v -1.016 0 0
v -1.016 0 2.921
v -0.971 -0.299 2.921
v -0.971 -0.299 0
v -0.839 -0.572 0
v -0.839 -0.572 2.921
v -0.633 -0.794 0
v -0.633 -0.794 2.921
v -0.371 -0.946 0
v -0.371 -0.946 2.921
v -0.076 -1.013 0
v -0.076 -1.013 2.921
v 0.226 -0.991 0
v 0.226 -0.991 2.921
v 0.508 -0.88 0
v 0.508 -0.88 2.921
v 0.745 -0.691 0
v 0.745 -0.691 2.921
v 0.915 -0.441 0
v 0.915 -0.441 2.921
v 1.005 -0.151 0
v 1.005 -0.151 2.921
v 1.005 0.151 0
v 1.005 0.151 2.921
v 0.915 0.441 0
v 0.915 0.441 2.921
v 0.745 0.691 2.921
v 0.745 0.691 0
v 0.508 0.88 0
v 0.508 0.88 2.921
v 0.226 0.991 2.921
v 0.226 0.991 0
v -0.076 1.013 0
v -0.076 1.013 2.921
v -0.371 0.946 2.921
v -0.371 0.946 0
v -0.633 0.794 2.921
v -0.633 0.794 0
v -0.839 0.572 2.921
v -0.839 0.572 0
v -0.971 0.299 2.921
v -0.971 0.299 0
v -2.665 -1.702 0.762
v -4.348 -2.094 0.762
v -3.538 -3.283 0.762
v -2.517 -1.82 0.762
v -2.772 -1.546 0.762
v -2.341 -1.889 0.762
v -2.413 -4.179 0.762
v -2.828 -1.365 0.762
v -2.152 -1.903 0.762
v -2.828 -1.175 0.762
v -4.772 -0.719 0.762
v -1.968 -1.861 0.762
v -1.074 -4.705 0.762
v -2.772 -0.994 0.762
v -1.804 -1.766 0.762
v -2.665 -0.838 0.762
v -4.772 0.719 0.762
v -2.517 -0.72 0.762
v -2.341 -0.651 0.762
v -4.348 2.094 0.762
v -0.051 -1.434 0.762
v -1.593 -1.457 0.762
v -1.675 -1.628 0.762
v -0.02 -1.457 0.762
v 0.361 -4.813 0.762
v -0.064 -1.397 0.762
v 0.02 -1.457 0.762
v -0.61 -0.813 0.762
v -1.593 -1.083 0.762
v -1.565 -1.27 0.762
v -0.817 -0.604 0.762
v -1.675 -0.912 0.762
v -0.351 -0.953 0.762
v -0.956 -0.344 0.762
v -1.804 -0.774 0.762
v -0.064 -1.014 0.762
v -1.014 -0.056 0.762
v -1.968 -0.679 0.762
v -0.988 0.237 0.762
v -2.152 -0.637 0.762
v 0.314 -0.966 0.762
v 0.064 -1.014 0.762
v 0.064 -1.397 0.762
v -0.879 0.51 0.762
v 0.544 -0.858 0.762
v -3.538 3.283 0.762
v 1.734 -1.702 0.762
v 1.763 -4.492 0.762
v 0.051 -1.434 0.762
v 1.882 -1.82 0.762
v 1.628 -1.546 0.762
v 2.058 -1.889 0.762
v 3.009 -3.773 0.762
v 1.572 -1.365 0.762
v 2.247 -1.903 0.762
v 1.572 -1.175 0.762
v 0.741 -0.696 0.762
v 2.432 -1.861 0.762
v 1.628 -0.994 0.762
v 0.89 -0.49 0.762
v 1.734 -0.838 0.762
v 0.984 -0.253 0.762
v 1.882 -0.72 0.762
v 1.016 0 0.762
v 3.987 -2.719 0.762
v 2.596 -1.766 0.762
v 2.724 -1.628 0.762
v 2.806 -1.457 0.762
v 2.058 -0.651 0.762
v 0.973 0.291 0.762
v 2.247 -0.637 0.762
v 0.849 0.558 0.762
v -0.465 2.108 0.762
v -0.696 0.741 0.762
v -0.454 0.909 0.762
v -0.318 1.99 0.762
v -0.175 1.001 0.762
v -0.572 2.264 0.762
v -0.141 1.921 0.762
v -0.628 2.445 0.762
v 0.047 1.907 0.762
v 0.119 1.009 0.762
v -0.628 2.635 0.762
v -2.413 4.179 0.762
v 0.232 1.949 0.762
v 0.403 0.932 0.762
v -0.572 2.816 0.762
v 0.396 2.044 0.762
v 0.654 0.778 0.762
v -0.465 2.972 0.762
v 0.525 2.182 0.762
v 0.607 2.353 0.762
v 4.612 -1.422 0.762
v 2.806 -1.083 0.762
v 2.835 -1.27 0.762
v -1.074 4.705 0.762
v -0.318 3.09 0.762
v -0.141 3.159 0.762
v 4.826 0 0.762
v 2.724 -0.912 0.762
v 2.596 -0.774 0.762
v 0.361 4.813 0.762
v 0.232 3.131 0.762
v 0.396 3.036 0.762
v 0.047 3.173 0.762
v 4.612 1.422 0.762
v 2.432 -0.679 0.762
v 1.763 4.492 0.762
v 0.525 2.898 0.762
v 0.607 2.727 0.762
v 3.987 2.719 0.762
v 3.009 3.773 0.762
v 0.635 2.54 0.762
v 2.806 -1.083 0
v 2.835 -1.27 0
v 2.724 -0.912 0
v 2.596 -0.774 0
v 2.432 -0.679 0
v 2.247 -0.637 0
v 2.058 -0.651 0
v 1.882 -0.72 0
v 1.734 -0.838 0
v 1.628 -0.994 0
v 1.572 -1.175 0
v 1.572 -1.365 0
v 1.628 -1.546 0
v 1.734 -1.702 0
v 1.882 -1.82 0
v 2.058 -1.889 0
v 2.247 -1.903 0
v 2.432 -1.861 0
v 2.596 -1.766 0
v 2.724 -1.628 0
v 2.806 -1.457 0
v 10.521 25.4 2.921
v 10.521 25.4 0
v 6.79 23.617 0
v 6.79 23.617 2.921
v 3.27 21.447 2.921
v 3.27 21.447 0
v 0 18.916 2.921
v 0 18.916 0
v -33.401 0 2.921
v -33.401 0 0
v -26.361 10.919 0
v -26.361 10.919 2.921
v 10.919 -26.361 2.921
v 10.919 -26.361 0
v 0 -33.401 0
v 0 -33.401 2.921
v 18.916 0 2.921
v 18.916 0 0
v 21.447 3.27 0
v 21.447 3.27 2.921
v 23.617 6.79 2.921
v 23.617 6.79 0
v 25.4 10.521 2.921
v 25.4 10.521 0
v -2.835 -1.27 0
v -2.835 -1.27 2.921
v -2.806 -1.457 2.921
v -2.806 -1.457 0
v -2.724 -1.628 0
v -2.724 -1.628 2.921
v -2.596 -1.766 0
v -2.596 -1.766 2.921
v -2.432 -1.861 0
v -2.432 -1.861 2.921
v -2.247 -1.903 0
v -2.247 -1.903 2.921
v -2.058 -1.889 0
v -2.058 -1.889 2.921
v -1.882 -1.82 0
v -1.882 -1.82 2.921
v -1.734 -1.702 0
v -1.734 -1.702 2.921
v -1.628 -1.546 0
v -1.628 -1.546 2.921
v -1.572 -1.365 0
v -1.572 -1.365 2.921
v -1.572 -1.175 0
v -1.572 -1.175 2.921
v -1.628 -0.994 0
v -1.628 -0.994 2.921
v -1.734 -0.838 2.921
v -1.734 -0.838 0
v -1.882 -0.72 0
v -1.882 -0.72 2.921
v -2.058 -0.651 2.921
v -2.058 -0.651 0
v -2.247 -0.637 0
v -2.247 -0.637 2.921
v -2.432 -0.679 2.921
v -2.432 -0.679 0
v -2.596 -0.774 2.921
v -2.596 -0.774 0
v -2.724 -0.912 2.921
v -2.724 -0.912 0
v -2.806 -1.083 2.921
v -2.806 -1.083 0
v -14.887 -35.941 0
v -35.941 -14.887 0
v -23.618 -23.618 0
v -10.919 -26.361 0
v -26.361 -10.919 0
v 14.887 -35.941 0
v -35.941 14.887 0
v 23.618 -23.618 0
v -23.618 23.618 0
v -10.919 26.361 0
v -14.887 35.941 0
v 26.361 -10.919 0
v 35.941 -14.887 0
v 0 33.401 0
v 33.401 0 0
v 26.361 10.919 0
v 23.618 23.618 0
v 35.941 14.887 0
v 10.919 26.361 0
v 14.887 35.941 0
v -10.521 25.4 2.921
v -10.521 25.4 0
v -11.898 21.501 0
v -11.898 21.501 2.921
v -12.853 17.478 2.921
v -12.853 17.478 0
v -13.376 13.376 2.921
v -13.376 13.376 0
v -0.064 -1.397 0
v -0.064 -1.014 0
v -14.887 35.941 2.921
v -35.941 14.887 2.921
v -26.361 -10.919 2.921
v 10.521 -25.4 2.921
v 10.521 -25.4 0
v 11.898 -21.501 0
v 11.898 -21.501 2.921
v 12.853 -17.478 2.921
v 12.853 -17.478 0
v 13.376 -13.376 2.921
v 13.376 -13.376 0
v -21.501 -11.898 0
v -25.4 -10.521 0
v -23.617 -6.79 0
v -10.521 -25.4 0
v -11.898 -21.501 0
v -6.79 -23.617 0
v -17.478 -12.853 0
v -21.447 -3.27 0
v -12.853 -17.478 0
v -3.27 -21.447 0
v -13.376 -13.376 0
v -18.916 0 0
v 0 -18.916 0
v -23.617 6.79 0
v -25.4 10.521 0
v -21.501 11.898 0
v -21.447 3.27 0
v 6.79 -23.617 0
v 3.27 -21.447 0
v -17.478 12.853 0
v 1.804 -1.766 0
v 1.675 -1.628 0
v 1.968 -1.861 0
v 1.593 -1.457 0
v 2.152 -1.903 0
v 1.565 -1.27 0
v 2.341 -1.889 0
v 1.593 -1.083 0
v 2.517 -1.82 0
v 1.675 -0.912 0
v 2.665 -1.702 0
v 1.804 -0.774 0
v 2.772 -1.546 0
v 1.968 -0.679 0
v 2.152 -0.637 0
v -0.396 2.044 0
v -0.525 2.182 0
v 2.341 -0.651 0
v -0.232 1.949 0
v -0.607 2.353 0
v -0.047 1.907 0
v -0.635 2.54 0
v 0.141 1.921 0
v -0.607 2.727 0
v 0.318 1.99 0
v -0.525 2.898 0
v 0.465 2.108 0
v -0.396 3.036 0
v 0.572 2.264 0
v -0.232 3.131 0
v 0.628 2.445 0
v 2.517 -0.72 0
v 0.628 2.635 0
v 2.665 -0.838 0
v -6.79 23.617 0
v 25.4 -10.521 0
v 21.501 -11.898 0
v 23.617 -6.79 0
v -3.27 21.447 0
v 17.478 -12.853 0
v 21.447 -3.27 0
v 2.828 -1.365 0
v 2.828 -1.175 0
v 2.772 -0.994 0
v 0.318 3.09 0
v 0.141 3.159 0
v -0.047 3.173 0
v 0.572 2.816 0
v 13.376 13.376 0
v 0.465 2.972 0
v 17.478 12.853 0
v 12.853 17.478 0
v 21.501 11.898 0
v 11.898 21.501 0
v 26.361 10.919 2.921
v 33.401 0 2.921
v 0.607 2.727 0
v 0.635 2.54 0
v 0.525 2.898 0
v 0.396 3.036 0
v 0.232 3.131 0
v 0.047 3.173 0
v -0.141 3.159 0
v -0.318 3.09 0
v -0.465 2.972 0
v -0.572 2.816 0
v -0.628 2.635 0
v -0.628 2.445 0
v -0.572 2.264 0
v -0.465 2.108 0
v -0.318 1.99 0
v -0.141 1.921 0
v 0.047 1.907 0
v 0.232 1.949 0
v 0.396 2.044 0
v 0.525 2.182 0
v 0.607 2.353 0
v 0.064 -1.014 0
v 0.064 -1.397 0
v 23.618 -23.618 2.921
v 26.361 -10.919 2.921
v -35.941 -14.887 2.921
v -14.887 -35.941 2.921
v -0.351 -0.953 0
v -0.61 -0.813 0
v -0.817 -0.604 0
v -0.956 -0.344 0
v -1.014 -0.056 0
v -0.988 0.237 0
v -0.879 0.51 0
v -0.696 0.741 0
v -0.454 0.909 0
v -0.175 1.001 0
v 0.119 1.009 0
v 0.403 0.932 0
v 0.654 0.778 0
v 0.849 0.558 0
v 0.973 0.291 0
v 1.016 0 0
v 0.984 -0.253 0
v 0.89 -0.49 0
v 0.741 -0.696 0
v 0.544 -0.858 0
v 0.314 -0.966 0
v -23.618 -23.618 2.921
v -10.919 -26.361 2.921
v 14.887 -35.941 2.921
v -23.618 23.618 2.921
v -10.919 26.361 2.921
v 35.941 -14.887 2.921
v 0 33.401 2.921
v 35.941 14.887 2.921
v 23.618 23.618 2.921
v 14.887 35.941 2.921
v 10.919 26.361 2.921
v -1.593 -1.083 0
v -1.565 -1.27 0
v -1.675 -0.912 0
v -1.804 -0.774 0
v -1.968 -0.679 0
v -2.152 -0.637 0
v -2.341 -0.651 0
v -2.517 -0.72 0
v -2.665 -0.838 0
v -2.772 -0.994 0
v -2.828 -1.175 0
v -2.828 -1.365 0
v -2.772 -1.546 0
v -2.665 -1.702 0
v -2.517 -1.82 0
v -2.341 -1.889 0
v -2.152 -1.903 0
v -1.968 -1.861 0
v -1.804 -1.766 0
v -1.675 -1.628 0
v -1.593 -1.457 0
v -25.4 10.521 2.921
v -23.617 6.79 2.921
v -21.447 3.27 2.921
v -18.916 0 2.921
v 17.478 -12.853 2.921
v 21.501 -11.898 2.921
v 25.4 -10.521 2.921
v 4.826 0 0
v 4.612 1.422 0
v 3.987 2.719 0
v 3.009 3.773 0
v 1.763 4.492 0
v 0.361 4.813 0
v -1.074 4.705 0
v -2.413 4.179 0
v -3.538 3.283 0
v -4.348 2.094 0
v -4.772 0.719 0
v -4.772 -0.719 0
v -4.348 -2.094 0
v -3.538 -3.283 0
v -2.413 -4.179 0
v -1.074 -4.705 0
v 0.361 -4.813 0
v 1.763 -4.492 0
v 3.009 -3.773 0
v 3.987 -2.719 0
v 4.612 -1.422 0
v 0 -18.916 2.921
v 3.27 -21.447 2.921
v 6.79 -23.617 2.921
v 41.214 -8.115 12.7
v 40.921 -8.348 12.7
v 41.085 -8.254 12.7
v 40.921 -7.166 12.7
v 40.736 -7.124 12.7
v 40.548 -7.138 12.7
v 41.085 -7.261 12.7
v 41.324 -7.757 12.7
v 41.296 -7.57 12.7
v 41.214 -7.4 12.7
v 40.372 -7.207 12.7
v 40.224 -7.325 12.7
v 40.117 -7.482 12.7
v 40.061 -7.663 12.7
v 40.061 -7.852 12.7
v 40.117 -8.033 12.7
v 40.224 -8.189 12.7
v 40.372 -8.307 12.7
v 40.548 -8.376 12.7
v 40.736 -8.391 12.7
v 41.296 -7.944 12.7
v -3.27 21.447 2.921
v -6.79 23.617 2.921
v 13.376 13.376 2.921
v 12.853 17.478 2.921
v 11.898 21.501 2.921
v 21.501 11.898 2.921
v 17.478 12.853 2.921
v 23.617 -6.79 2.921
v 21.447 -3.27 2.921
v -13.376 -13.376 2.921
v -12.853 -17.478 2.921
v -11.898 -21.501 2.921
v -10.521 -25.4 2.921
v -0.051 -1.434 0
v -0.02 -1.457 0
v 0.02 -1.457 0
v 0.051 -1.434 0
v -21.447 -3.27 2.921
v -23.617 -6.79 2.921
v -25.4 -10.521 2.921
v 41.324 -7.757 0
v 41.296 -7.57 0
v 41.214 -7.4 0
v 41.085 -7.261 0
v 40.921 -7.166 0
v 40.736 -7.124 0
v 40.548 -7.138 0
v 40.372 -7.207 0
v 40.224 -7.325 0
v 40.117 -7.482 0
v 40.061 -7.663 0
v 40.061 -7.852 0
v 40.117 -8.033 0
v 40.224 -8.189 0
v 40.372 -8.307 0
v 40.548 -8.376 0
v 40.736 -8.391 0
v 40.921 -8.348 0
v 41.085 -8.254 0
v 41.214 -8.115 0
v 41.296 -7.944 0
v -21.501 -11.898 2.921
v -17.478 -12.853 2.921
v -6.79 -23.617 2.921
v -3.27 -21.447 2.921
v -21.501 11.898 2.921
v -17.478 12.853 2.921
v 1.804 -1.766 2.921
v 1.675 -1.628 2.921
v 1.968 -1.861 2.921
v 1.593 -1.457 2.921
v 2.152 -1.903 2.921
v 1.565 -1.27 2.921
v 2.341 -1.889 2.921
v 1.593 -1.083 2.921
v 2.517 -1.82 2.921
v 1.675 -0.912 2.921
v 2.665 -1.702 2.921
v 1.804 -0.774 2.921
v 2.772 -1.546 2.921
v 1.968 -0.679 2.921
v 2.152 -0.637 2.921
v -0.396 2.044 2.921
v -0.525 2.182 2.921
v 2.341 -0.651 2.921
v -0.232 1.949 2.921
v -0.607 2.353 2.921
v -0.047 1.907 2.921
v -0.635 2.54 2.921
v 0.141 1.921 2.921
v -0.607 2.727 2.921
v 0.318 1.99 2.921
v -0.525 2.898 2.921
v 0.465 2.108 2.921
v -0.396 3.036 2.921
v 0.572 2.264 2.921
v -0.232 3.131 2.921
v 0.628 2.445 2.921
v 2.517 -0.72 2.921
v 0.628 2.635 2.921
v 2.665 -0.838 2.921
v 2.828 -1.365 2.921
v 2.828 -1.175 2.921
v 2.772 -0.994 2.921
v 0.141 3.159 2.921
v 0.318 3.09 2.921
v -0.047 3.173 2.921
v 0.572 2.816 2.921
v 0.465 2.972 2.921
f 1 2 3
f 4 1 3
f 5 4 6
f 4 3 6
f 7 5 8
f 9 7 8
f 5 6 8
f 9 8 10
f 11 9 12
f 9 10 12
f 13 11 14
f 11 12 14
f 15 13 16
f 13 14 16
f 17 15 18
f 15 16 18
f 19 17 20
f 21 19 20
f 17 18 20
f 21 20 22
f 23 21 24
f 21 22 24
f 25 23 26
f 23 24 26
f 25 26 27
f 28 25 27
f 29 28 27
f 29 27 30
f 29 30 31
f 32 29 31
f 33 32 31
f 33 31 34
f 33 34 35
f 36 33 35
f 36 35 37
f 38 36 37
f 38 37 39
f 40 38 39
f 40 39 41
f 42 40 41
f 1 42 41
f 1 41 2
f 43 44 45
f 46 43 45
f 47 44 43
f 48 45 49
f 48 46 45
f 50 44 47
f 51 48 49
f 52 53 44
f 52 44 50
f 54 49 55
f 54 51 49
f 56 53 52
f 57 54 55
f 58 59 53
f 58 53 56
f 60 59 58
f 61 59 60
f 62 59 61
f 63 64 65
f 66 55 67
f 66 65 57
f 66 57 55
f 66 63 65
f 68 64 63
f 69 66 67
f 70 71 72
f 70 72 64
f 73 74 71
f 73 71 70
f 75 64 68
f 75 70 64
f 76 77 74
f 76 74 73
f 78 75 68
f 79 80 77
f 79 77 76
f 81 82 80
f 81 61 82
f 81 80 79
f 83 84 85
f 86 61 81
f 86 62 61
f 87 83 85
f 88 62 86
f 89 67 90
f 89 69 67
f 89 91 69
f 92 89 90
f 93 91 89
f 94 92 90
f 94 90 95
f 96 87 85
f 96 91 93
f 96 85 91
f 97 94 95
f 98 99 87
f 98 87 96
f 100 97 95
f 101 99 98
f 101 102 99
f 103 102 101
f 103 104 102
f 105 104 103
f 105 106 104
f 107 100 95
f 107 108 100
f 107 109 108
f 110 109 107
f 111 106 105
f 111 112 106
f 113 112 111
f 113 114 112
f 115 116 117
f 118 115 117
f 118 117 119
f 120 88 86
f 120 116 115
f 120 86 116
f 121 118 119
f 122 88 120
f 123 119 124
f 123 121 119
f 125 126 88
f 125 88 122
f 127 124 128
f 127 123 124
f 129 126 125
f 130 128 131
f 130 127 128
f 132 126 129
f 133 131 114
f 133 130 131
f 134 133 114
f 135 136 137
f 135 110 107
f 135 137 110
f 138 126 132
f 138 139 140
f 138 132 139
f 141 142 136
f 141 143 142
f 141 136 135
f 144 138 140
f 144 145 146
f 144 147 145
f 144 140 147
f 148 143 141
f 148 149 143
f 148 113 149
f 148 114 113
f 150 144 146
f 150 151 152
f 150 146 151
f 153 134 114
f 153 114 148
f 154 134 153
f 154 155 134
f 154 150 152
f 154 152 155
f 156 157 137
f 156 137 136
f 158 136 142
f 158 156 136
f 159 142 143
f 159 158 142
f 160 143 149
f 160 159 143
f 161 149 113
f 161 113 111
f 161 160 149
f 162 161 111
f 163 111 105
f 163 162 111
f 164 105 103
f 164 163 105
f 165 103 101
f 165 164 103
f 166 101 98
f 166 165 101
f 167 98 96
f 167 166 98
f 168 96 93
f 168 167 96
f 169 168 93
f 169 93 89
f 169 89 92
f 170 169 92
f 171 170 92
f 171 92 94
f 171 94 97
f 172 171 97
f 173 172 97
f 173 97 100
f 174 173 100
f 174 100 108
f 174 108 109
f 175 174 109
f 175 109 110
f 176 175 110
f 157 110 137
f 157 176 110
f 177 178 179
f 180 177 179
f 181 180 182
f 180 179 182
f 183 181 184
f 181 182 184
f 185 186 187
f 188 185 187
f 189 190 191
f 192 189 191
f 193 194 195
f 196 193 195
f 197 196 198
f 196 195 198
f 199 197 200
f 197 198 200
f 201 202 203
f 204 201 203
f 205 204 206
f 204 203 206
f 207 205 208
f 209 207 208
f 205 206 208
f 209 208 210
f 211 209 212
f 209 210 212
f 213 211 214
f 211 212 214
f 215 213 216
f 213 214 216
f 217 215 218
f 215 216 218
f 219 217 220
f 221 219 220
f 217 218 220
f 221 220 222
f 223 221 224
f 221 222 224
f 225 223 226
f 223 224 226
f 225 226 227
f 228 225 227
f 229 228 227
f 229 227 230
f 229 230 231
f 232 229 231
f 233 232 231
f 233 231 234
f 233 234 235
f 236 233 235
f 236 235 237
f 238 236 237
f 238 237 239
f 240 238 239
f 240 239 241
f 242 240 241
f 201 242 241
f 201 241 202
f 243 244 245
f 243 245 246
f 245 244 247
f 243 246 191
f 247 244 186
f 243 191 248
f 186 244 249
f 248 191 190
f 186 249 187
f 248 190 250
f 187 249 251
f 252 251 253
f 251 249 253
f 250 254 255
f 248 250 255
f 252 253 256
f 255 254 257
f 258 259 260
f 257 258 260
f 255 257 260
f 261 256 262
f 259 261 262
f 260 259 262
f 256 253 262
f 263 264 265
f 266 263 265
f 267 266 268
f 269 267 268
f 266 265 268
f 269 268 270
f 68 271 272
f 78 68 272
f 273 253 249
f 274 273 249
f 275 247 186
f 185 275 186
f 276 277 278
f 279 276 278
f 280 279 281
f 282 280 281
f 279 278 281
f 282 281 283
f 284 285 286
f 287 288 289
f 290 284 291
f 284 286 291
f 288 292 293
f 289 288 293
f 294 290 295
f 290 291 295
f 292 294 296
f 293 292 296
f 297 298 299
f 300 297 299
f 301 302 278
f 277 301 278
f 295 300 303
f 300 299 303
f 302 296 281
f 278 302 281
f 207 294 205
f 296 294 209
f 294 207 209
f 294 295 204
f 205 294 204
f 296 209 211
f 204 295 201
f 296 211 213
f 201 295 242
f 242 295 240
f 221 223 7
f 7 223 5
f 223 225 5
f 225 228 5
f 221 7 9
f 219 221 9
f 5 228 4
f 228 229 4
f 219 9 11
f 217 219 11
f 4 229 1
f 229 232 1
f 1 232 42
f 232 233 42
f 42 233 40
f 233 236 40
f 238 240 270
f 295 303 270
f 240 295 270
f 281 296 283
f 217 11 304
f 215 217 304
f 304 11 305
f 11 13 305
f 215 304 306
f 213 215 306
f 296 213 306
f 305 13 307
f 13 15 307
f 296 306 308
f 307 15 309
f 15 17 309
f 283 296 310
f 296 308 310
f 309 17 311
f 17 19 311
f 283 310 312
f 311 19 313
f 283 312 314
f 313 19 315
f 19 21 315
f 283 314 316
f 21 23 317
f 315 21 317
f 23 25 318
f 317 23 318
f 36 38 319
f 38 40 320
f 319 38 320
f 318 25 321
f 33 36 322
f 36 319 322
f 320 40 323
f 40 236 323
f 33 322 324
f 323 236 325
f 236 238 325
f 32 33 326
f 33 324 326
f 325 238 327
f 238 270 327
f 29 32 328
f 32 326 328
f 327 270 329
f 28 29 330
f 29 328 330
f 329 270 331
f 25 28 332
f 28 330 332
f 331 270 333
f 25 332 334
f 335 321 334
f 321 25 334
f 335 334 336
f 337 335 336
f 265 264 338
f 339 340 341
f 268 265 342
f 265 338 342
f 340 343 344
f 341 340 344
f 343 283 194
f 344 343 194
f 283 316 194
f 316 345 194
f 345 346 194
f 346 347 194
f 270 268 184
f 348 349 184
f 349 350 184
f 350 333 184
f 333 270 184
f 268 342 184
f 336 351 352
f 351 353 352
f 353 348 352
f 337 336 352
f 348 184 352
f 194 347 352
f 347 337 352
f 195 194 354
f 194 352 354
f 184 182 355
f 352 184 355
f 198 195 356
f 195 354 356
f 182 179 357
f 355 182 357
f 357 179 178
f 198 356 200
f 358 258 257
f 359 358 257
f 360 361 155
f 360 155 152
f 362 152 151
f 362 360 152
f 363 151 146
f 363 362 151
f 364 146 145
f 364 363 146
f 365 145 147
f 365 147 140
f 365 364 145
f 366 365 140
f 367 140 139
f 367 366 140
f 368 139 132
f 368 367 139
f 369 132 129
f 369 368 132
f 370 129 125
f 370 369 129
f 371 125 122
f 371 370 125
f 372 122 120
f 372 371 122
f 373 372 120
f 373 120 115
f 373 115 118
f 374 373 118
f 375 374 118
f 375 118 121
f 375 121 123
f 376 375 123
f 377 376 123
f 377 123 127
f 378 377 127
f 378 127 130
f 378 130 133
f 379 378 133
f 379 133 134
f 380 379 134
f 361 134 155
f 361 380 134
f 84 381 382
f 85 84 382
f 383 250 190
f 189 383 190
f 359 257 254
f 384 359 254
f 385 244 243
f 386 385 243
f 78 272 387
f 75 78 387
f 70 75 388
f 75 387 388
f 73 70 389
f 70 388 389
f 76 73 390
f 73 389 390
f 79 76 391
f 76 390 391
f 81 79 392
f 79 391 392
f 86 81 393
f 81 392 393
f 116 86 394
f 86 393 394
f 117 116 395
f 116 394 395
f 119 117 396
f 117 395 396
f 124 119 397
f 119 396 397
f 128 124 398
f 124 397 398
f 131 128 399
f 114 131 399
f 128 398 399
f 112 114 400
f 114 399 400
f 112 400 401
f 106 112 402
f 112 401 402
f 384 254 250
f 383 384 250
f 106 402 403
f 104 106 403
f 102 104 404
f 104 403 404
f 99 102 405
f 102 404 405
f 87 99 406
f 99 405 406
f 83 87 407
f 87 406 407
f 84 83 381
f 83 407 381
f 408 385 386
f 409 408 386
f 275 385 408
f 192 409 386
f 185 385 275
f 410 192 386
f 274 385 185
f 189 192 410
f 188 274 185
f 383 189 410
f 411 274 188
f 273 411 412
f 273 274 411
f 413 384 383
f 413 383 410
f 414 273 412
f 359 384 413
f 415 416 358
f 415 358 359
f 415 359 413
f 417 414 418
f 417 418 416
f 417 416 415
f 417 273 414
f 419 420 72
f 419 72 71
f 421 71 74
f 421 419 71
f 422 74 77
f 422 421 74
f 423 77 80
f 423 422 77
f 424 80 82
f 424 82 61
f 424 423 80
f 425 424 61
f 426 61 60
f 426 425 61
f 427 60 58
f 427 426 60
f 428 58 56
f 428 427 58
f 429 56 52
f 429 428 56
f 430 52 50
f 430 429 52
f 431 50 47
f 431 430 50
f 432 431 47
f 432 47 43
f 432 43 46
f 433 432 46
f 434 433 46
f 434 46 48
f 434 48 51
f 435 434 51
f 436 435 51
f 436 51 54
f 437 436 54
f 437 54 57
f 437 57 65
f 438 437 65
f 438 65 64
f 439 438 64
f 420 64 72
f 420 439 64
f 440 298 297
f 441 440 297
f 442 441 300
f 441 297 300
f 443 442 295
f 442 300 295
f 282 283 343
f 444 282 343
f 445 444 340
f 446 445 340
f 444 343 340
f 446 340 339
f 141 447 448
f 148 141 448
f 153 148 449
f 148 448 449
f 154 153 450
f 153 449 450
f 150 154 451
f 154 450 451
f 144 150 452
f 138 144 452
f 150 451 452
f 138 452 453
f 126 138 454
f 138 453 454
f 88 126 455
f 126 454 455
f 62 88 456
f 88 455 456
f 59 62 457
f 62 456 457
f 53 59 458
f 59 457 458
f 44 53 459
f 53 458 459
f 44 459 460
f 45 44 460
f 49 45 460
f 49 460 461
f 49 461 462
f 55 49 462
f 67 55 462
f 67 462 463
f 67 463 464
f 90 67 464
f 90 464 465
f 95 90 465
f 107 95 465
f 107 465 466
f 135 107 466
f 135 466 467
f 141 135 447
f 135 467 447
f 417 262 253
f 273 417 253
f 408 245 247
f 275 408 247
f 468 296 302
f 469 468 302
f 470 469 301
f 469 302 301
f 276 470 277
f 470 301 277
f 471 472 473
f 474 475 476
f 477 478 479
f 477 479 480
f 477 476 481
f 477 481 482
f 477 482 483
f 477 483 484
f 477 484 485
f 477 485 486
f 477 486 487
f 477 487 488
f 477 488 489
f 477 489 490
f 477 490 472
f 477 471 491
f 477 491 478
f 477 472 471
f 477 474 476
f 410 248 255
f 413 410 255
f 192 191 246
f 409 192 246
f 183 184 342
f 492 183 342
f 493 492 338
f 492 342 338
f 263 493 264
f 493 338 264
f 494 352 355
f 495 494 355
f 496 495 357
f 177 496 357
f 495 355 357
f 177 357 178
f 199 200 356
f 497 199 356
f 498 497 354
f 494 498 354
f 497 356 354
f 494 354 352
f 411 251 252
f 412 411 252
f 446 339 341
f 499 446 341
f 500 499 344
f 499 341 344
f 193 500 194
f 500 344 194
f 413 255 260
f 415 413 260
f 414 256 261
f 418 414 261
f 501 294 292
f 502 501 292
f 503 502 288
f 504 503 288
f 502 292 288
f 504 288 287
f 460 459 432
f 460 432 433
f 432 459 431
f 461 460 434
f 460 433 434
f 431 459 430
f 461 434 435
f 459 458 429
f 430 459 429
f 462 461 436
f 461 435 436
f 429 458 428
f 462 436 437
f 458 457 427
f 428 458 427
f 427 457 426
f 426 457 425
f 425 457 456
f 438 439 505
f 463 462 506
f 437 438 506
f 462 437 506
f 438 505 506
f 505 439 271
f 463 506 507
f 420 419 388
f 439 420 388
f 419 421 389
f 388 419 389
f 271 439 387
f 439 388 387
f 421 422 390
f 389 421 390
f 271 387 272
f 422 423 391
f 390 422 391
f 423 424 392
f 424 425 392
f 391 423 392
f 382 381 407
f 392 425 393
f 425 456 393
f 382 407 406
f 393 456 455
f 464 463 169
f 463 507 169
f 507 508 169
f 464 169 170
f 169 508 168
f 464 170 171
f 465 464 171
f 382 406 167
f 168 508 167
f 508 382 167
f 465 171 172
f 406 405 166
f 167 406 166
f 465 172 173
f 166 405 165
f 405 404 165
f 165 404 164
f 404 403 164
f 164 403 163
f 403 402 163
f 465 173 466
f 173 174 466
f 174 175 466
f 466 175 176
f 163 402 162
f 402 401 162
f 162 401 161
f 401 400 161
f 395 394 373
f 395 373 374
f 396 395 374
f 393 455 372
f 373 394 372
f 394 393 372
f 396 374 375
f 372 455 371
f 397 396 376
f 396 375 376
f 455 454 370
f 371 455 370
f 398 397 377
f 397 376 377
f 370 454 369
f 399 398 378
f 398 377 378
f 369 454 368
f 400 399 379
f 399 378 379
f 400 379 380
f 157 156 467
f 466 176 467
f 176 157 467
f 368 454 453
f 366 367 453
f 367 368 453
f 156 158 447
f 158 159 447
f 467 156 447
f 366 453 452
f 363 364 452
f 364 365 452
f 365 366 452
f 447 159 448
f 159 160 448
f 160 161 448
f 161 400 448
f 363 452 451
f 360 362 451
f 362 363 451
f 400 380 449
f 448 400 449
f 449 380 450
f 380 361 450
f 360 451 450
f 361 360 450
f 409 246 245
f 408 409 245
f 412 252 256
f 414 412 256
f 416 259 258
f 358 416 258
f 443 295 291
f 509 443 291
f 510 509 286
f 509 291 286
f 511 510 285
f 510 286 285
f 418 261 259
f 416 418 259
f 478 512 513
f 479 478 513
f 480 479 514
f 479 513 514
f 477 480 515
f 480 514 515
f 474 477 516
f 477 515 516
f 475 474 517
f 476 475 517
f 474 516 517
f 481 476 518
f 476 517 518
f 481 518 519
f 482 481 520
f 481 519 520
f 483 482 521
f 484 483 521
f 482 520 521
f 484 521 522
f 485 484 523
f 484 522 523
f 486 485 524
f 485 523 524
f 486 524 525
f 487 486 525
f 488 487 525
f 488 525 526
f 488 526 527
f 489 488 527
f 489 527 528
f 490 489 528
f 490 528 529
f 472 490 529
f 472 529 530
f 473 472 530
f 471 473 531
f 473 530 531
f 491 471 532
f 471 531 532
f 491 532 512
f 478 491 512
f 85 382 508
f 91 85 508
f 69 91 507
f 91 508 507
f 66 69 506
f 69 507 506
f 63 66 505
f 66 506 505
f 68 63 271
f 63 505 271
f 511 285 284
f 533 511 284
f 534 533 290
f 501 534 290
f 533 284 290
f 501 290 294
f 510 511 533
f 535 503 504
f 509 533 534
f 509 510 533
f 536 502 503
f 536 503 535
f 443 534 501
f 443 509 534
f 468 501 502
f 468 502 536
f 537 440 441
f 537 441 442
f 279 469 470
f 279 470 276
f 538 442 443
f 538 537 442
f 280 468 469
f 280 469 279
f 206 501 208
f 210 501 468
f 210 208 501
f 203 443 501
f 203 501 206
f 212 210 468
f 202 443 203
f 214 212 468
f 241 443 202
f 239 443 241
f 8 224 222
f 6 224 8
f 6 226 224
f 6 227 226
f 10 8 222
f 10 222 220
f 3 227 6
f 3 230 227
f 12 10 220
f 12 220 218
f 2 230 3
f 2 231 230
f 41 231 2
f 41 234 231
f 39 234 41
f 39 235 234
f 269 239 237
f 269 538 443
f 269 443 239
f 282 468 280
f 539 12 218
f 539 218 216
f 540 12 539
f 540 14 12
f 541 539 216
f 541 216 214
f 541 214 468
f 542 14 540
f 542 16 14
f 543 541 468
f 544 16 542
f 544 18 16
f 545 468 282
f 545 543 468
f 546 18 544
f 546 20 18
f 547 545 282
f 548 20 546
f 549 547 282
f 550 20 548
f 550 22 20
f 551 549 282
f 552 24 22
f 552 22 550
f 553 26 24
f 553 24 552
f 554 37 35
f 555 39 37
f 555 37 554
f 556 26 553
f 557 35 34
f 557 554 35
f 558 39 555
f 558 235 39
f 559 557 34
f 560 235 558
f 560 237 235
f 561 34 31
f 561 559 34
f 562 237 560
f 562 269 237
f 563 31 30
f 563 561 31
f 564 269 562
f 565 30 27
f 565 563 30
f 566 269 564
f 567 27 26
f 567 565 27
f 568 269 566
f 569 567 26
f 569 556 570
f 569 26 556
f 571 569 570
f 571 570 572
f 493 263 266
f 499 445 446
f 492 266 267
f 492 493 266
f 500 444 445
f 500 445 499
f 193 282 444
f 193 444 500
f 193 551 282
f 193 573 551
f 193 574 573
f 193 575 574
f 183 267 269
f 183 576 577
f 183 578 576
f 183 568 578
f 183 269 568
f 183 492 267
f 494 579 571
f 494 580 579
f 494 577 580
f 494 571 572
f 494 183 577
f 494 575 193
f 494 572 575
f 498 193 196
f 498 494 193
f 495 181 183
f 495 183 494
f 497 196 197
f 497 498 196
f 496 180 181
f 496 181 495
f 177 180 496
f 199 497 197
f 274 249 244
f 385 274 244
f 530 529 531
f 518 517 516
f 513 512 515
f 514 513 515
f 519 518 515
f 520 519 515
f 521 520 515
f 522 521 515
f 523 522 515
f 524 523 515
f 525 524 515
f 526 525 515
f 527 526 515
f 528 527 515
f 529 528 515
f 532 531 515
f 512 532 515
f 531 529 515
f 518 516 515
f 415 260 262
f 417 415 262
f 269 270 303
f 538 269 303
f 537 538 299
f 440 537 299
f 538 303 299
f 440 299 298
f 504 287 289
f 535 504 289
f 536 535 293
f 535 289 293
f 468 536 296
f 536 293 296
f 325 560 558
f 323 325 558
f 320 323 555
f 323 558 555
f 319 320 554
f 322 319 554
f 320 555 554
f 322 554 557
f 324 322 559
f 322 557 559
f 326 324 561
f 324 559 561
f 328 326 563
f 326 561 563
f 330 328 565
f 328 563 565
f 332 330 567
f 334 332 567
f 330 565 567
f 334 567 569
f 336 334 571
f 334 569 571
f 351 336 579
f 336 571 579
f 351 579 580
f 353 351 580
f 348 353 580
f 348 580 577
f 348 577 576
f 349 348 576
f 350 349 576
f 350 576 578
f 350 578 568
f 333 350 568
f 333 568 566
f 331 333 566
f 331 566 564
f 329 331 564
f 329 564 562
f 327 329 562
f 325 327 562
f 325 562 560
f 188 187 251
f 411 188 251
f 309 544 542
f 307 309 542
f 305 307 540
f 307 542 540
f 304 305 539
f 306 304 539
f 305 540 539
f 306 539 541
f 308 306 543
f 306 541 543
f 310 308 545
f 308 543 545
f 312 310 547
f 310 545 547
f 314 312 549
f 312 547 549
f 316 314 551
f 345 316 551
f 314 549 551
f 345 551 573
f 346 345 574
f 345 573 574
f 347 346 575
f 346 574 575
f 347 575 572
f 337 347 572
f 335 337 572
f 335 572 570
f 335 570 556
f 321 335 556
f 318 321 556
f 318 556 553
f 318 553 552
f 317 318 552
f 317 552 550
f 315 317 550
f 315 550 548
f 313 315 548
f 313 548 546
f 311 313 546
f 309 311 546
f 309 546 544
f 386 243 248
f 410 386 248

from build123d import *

# Parameters (mm, degrees)
F1_DEPTH = 2.921
F2_D     = 2.032
F2_DEPTH = 12.7
F2_TIP   = 0.6104743889
F3_D     = 1.27
F3_DEPTH = 12.7
F3_TIP   = 0.3815464931
F5_DEPTH = 2.921
F6_R     = 4.826
F6_R_2   = 0.635
F7_DEPTH = 0.762
F8_R     = 0.635
F9_DEPTH = 12.7


with BuildPart() as f1:
    # F0 (on Top) → F1 (new body)
    with BuildSketch(Plane.XY):
        with BuildLine():
            ThreePointArc((-5.446083021, 13.1480074912), (-2.8705353277, 16.1713104582), (0, 18.9160934521))
            ThreePointArc((0, 18.9160934521), (-5.0012444453, 22.5787441587), (-10.5210244843, 25.4))
            ThreePointArc((-10.5210244843, 25.4), (-12.4291692436, 19.5019969669), (-13.3756979535, 13.3756979535))
            ThreePointArc((-13.3756979535, 13.3756979535), (-9.4050682898, 13.4646182815), (-5.446083021, 13.1480074912))
        make_face()
        with BuildLine():
            ThreePointArc((13.1480074912, -5.446083021), (13.4646182815, -9.4050682898), (13.3756979535, -13.3756979535))
            ThreePointArc((13.3756979535, -13.3756979535), (19.5019969669, -12.4291692436), (25.4, -10.5210244843))
            ThreePointArc((25.4, -10.5210244843), (22.5787441587, -5.0012444453), (18.9160934521, 0))
            ThreePointArc((18.9160934521, 0), (16.1713104582, -2.8705353277), (13.1480074912, -5.446083021))
        make_face()
        with BuildLine():
            ThreePointArc((5.446083021, -13.1480074912), (9.4050682898, -13.4646182815), (13.3756979535, -13.3756979535))
            ThreePointArc((13.3756979535, -13.3756979535), (13.4646182815, -9.4050682898), (13.1480074912, -5.446083021))
            ThreePointArc((13.1480074912, -5.446083021), (10.8820575886, -7.0593898615), (8.5065612285, -8.5065612285))
            ThreePointArc((8.5065612285, -8.5065612285), (7.0593898615, -10.8820575886), (5.446083021, -13.1480074912))
        make_face()
        with BuildLine():
            ThreePointArc((-5.446083021, -13.1480074912), (-2.8705353277, -16.1713104582), (0, -18.9160934521))
            ThreePointArc((0, -18.9160934521), (2.8705353277, -16.1713104582), (5.446083021, -13.1480074912))
            ThreePointArc((5.446083021, -13.1480074912), (2.7030342721, -12.6865191563), (0, -12.0300942585))
            ThreePointArc((0, -12.0300942585), (-2.7030342721, -12.6865191563), (-5.446083021, -13.1480074912))
        make_face()
        with BuildLine():
            ThreePointArc((-10.5210244843, -25.4), (-5.0012444453, -22.5787441587), (0, -18.9160934521))
            ThreePointArc((0, -18.9160934521), (-2.8705353277, -16.1713104582), (-5.446083021, -13.1480074912))
            ThreePointArc((-5.446083021, -13.1480074912), (-9.4050682898, -13.4646182815), (-13.3756979535, -13.3756979535))
            ThreePointArc((-13.3756979535, -13.3756979535), (-12.4291692436, -19.5019969669), (-10.5210244843, -25.4))
        make_face()
        with BuildLine():
            ThreePointArc((-13.3756979535, -13.3756979535), (-9.4050682898, -13.4646182815), (-5.446083021, -13.1480074912))
            ThreePointArc((-5.446083021, -13.1480074912), (-7.0593898615, -10.8820575886), (-8.5065612285, -8.5065612285))
            ThreePointArc((-8.5065612285, -8.5065612285), (-10.8820575886, -7.0593898615), (-13.1480074912, -5.446083021))
            ThreePointArc((-13.1480074912, -5.446083021), (-13.4646182815, -9.4050682898), (-13.3756979535, -13.3756979535))
        make_face()
        with BuildLine():
            ThreePointArc((-25.4, -10.5210244843), (-19.5019969669, -12.4291692436), (-13.3756979535, -13.3756979535))
            ThreePointArc((-13.3756979535, -13.3756979535), (-13.4646182815, -9.4050682898), (-13.1480074912, -5.446083021))
            ThreePointArc((-13.1480074912, -5.446083021), (-16.1713104582, -2.8705353277), (-18.9160934521, 0))
            ThreePointArc((-18.9160934521, 0), (-22.5787441587, -5.0012444453), (-25.4, -10.5210244843))
        make_face()
        with BuildLine():
            ThreePointArc((-13.1480074912, -5.446083021), (-12.6865191563, -2.7030342721), (-12.0300942585, 0))
            ThreePointArc((-12.0300942585, 0), (-12.6865191563, 2.7030342721), (-13.1480074912, 5.446083021))
            ThreePointArc((-13.1480074912, 5.446083021), (-16.1713104582, 2.8705353277), (-18.9160934521, 0))
            ThreePointArc((-18.9160934521, 0), (-16.1713104582, -2.8705353277), (-13.1480074912, -5.446083021))
        make_face()
        with BuildLine():
            ThreePointArc((-18.9160934521, 0), (-16.1713104582, 2.8705353277), (-13.1480074912, 5.446083021))
            ThreePointArc((-13.1480074912, 5.446083021), (-13.4646182815, 9.4050682898), (-13.3756979535, 13.3756979535))
            ThreePointArc((-13.3756979535, 13.3756979535), (-19.5019969669, 12.4291692436), (-25.4, 10.5210244843))
            ThreePointArc((-25.4, 10.5210244843), (-22.5787441587, 5.0012444453), (-18.9160934521, 0))
        make_face()
        with BuildLine():
            ThreePointArc((-13.3756979535, 13.3756979535), (-13.4646182815, 9.4050682898), (-13.1480074912, 5.446083021))
            ThreePointArc((-13.1480074912, 5.446083021), (-10.8820575886, 7.0593898615), (-8.5065612285, 8.5065612285))
            ThreePointArc((-8.5065612285, 8.5065612285), (-7.0593898615, 10.8820575886), (-5.446083021, 13.1480074912))
            ThreePointArc((-5.446083021, 13.1480074912), (-9.4050682898, 13.4646182815), (-13.3756979535, 13.3756979535))
        make_face()
        with BuildLine():
            ThreePointArc((0, -18.9160934521), (5.0012444453, -22.5787441587), (10.5210244843, -25.4))
            ThreePointArc((10.5210244843, -25.4), (12.4291692436, -19.5019969669), (13.3756979535, -13.3756979535))
            ThreePointArc((13.3756979535, -13.3756979535), (9.4050682898, -13.4646182815), (5.446083021, -13.1480074912))
            ThreePointArc((5.446083021, -13.1480074912), (2.8705353277, -16.1713104582), (0, -18.9160934521))
        make_face()
        with BuildLine():
            ThreePointArc((0, 12.0300942585), (2.7030342721, 12.6865191563), (5.446083021, 13.1480074912))
            ThreePointArc((5.446083021, 13.1480074912), (2.8705353277, 16.1713104582), (0, 18.9160934521))
            ThreePointArc((0, 18.9160934521), (-2.8705353277, 16.1713104582), (-5.446083021, 13.1480074912))
            ThreePointArc((-5.446083021, 13.1480074912), (-2.7030342721, 12.6865191563), (0, 12.0300942585))
        make_face()
        with BuildLine():
            ThreePointArc((0, 18.9160934521), (2.8705353277, 16.1713104582), (5.446083021, 13.1480074912))
            ThreePointArc((5.446083021, 13.1480074912), (9.4050682898, 13.4646182815), (13.3756979535, 13.3756979535))
            ThreePointArc((13.3756979535, 13.3756979535), (12.4291692436, 19.5019969669), (10.5210244843, 25.4))
            ThreePointArc((10.5210244843, 25.4), (5.0012444453, 22.5787441587), (0, 18.9160934521))
        make_face()
        with BuildLine():
            ThreePointArc((5.446083021, 13.1480074912), (7.0593898615, 10.8820575886), (8.5065612285, 8.5065612285))
            ThreePointArc((8.5065612285, 8.5065612285), (10.8820575886, 7.0593898615), (13.1480074912, 5.446083021))
            ThreePointArc((13.1480074912, 5.446083021), (13.4646182815, 9.4050682898), (13.3756979535, 13.3756979535))
            ThreePointArc((13.3756979535, 13.3756979535), (9.4050682898, 13.4646182815), (5.446083021, 13.1480074912))
        make_face()
        with BuildLine():
            ThreePointArc((13.1480074912, 5.446083021), (16.1713104582, 2.8705353277), (18.9160934521, 0))
            ThreePointArc((18.9160934521, 0), (22.5787441587, 5.0012444453), (25.4, 10.5210244843))
            ThreePointArc((25.4, 10.5210244843), (19.5019969669, 12.4291692436), (13.3756979535, 13.3756979535))
            ThreePointArc((13.3756979535, 13.3756979535), (13.4646182815, 9.4050682898), (13.1480074912, 5.446083021))
        make_face()
        with BuildLine():
            ThreePointArc((12.0300942585, 0), (12.6865191563, -2.7030342721), (13.1480074912, -5.446083021))
            ThreePointArc((13.1480074912, -5.446083021), (16.1713104582, -2.8705353277), (18.9160934521, 0))
            ThreePointArc((18.9160934521, 0), (16.1713104582, 2.8705353277), (13.1480074912, 5.446083021))
            ThreePointArc((13.1480074912, 5.446083021), (12.6865191563, 2.7030342721), (12.0300942585, 0))
        make_face()
        with BuildLine():
            ThreePointArc((8.5065612285, 8.5065612285), (10.5210244843, 4.3579510314), (12.0300942585, 0))
            ThreePointArc((12.0300942585, 0), (12.6865191563, 2.7030342721), (13.1480074912, 5.446083021))
            ThreePointArc((13.1480074912, 5.446083021), (10.8820575886, 7.0593898615), (8.5065612285, 8.5065612285))
        make_face()
        with BuildLine():
            ThreePointArc((8.5065612285, -8.5065612285), (10.8820575886, -7.0593898615), (13.1480074912, -5.446083021))
            ThreePointArc((13.1480074912, -5.446083021), (12.6865191563, -2.7030342721), (12.0300942585, 0))
            ThreePointArc((12.0300942585, 0), (10.5210244843, -4.3579510314), (8.5065612285, -8.5065612285))
        make_face()
        with BuildLine():
            ThreePointArc((0, -12.0300942585), (2.7030342721, -12.6865191563), (5.446083021, -13.1480074912))
            ThreePointArc((5.446083021, -13.1480074912), (7.0593898615, -10.8820575886), (8.5065612285, -8.5065612285))
            ThreePointArc((8.5065612285, -8.5065612285), (4.3579510314, -10.5210244843), (0, -12.0300942585))
        make_face()
        with BuildLine():
            ThreePointArc((-8.5065612285, -8.5065612285), (-7.0593898615, -10.8820575886), (-5.446083021, -13.1480074912))
            ThreePointArc((-5.446083021, -13.1480074912), (-2.7030342721, -12.6865191563), (0, -12.0300942585))
            ThreePointArc((0, -12.0300942585), (-4.3579510314, -10.5210244843), (-8.5065612285, -8.5065612285))
        make_face()
        with BuildLine():
            ThreePointArc((-13.1480074912, -5.446083021), (-10.8820575886, -7.0593898615), (-8.5065612285, -8.5065612285))
            ThreePointArc((-8.5065612285, -8.5065612285), (-10.5210244843, -4.3579510314), (-12.0300942585, 0))
            ThreePointArc((-12.0300942585, 0), (-12.6865191563, -2.7030342721), (-13.1480074912, -5.446083021))
        make_face()
        with BuildLine():
            ThreePointArc((-13.1480074912, 5.446083021), (-12.6865191563, 2.7030342721), (-12.0300942585, 0))
            ThreePointArc((-12.0300942585, 0), (-10.5210244843, 4.3579510314), (-8.5065612285, 8.5065612285))
            ThreePointArc((-8.5065612285, 8.5065612285), (-10.8820575886, 7.0593898615), (-13.1480074912, 5.446083021))
        make_face()
        with BuildLine():
            ThreePointArc((-8.5065612285, 8.5065612285), (-4.3579510314, 10.5210244843), (0, 12.0300942585))
            ThreePointArc((0, 12.0300942585), (-2.7030342721, 12.6865191563), (-5.446083021, 13.1480074912))
            ThreePointArc((-5.446083021, 13.1480074912), (-7.0593898615, 10.8820575886), (-8.5065612285, 8.5065612285))
        make_face()
        with BuildLine():
            ThreePointArc((0, 12.0300942585), (4.3579510314, 10.5210244843), (8.5065612285, 8.5065612285))
            ThreePointArc((8.5065612285, 8.5065612285), (7.0593898615, 10.8820575886), (5.446083021, 13.1480074912))
            ThreePointArc((5.446083021, 13.1480074912), (2.7030342721, 12.6865191563), (0, 12.0300942585))
        make_face()
        with BuildLine():
            ThreePointArc((8.5065612285, -8.5065612285), (10.5210244843, -4.3579510314), (12.0300942585, 0))
            ThreePointArc((12.0300942585, 0), (10.5210244843, 4.3579510314), (8.5065612285, 8.5065612285))
            ThreePointArc((8.5065612285, 8.5065612285), (4.3579510314, 10.5210244843), (0, 12.0300942585))
            ThreePointArc((0, 12.0300942585), (-4.3579510314, 10.5210244843), (-8.5065612285, 8.5065612285))
            ThreePointArc((-8.5065612285, 8.5065612285), (-10.5210244843, 4.3579510314), (-12.0300942585, 0))
            ThreePointArc((-12.0300942585, 0), (-10.5210244843, -4.3579510314), (-8.5065612285, -8.5065612285))
            ThreePointArc((-8.5065612285, -8.5065612285), (-4.3579510314, -10.5210244843), (0, -12.0300942585))
            ThreePointArc((0, -12.0300942585), (4.3579510314, -10.5210244843), (8.5065612285, -8.5065612285))
        make_face()
    extrude(amount=F1_DEPTH)

    # F2
    with Locations(Plane(origin=(0, 0, 0), x_dir=(1, 0, 0), z_dir=(0, 0, -1))):
        with Locations((0, 0)):
            Hole(F2_D / 2, depth=F2_DEPTH)
            with Locations((0, 0, -(F2_DEPTH + F2_TIP / 2))):  # 118° drill point
                Cone(0, F2_D / 2, F2_TIP, mode=Mode.SUBTRACT)

    # F3
    with Locations(Plane(origin=(0, 0, 0), x_dir=(1, 0, 0), z_dir=(0, 0, -1))):
        with Locations((2.1997045256, 1.27), (-2.1997045256, 1.27), (0, -2.54)):
            Hole(F3_D / 2, depth=F3_DEPTH)
            with Locations((0, 0, -(F3_DEPTH + F3_TIP / 2))):  # 118° drill point
                Cone(0, F3_D / 2, F3_TIP, mode=Mode.SUBTRACT)


with BuildPart() as f5:
    # F4 (on Top) → F5 (new body)
    with BuildSketch(Plane.XY):
        Polygon((35.941, -14.8872496453), (35.941, 14.8872496453), (14.8872496453, 35.941), (-14.8872496453, 35.941), (-35.941, 14.8872496453), (-35.941, -14.8872496453), (-14.8872496453, -35.941), (14.8872496453, -35.941), align=None)
        Polygon((23.6180735984, 23.6180735984), (33.401, 13.8351471968), (33.401, 0), (33.401, -13.8351471968), (23.6180735984, -23.6180735984), (13.8351471968, -33.401), (0, -33.401), (-13.8351471968, -33.401), (-23.6180735984, -23.6180735984), (-33.401, -13.8351471968), (-33.401, 0), (-33.401, 13.8351471968), (-23.6180735984, 23.6180735984), (-13.8351471968, 33.401), (0, 33.401), (13.8351471968, 33.401), align=None, mode=Mode.SUBTRACT)
        Polygon((-10.9190994422, 26.3610379623), (0, 33.401), (-13.8351471968, 33.401), (-23.6180735984, 23.6180735984), align=None)
        Polygon((10.9190994422, 26.3610379623), (23.6180735984, 23.6180735984), (13.8351471968, 33.401), (0, 33.401), align=None)
        Polygon((33.401, 0), (33.401, 13.8351471968), (23.6180735984, 23.6180735984), (26.3610379623, 10.9190994422), align=None)
        Polygon((33.401, -13.8351471968), (33.401, 0), (26.3610379623, -10.9190994422), (23.6180735984, -23.6180735984), align=None)
        Polygon((-26.3610379623, 10.9190994422), (-23.6180735984, 23.6180735984), (-33.401, 13.8351471968), (-33.401, 0), align=None)
        Polygon((-13.8351471968, -33.401), (0, -33.401), (-10.9190994422, -26.3610379623), (-23.6180735984, -23.6180735984), align=None)
        Polygon((-33.401, -13.8351471968), (-23.6180735984, -23.6180735984), (-26.3610379623, -10.9190994422), (-33.401, 0), align=None)
        Polygon((13.8351471968, -33.401), (23.6180735984, -23.6180735984), (10.9190994422, -26.3610379623), (0, -33.401), align=None)
    extrude(amount=F5_DEPTH)


with BuildPart() as f7:
    # F6 (on Top) → F7 (new body)
    with BuildSketch(Plane.XY):
        Circle(F6_R)
        with Locations((-2.1997045256, -1.27)):
            Circle(F6_R_2, mode=Mode.SUBTRACT)
        with Locations((2.1997045256, -1.27)):
            Circle(F6_R_2, mode=Mode.SUBTRACT)
        with BuildLine():
            ThreePointArc((-0.0635, -1.0140136833), (-0.695607648, 0.7405308906), (1.016, 0))
            ThreePointArc((1.016, 0), (0.7405308906, -0.695607648), (0.0635, -1.0140136833))
            Line((0.0635, -1.0140136833), (0.0635, -1.397))
            ThreePointArc((0.0635, -1.397), (0, -1.4605), (-0.0635, -1.397))
            Line((-0.0635, -1.397), (-0.0635, -1.0140136833))
        make_face(mode=Mode.SUBTRACT)
        with Locations((0, 2.54)):
            Circle(F6_R_2, mode=Mode.SUBTRACT)
    extrude(amount=F7_DEPTH)


with BuildPart() as f9:
    # F8 (on Top) → F9 (new body)
    with BuildSketch(Plane.XY):
        with Locations((40.6890176237, -7.7573158778)):
            Circle(F8_R)
    extrude(amount=F9_DEPTH)


solid = Compound([f1.part, f5.part, f7.part, f9.part])
